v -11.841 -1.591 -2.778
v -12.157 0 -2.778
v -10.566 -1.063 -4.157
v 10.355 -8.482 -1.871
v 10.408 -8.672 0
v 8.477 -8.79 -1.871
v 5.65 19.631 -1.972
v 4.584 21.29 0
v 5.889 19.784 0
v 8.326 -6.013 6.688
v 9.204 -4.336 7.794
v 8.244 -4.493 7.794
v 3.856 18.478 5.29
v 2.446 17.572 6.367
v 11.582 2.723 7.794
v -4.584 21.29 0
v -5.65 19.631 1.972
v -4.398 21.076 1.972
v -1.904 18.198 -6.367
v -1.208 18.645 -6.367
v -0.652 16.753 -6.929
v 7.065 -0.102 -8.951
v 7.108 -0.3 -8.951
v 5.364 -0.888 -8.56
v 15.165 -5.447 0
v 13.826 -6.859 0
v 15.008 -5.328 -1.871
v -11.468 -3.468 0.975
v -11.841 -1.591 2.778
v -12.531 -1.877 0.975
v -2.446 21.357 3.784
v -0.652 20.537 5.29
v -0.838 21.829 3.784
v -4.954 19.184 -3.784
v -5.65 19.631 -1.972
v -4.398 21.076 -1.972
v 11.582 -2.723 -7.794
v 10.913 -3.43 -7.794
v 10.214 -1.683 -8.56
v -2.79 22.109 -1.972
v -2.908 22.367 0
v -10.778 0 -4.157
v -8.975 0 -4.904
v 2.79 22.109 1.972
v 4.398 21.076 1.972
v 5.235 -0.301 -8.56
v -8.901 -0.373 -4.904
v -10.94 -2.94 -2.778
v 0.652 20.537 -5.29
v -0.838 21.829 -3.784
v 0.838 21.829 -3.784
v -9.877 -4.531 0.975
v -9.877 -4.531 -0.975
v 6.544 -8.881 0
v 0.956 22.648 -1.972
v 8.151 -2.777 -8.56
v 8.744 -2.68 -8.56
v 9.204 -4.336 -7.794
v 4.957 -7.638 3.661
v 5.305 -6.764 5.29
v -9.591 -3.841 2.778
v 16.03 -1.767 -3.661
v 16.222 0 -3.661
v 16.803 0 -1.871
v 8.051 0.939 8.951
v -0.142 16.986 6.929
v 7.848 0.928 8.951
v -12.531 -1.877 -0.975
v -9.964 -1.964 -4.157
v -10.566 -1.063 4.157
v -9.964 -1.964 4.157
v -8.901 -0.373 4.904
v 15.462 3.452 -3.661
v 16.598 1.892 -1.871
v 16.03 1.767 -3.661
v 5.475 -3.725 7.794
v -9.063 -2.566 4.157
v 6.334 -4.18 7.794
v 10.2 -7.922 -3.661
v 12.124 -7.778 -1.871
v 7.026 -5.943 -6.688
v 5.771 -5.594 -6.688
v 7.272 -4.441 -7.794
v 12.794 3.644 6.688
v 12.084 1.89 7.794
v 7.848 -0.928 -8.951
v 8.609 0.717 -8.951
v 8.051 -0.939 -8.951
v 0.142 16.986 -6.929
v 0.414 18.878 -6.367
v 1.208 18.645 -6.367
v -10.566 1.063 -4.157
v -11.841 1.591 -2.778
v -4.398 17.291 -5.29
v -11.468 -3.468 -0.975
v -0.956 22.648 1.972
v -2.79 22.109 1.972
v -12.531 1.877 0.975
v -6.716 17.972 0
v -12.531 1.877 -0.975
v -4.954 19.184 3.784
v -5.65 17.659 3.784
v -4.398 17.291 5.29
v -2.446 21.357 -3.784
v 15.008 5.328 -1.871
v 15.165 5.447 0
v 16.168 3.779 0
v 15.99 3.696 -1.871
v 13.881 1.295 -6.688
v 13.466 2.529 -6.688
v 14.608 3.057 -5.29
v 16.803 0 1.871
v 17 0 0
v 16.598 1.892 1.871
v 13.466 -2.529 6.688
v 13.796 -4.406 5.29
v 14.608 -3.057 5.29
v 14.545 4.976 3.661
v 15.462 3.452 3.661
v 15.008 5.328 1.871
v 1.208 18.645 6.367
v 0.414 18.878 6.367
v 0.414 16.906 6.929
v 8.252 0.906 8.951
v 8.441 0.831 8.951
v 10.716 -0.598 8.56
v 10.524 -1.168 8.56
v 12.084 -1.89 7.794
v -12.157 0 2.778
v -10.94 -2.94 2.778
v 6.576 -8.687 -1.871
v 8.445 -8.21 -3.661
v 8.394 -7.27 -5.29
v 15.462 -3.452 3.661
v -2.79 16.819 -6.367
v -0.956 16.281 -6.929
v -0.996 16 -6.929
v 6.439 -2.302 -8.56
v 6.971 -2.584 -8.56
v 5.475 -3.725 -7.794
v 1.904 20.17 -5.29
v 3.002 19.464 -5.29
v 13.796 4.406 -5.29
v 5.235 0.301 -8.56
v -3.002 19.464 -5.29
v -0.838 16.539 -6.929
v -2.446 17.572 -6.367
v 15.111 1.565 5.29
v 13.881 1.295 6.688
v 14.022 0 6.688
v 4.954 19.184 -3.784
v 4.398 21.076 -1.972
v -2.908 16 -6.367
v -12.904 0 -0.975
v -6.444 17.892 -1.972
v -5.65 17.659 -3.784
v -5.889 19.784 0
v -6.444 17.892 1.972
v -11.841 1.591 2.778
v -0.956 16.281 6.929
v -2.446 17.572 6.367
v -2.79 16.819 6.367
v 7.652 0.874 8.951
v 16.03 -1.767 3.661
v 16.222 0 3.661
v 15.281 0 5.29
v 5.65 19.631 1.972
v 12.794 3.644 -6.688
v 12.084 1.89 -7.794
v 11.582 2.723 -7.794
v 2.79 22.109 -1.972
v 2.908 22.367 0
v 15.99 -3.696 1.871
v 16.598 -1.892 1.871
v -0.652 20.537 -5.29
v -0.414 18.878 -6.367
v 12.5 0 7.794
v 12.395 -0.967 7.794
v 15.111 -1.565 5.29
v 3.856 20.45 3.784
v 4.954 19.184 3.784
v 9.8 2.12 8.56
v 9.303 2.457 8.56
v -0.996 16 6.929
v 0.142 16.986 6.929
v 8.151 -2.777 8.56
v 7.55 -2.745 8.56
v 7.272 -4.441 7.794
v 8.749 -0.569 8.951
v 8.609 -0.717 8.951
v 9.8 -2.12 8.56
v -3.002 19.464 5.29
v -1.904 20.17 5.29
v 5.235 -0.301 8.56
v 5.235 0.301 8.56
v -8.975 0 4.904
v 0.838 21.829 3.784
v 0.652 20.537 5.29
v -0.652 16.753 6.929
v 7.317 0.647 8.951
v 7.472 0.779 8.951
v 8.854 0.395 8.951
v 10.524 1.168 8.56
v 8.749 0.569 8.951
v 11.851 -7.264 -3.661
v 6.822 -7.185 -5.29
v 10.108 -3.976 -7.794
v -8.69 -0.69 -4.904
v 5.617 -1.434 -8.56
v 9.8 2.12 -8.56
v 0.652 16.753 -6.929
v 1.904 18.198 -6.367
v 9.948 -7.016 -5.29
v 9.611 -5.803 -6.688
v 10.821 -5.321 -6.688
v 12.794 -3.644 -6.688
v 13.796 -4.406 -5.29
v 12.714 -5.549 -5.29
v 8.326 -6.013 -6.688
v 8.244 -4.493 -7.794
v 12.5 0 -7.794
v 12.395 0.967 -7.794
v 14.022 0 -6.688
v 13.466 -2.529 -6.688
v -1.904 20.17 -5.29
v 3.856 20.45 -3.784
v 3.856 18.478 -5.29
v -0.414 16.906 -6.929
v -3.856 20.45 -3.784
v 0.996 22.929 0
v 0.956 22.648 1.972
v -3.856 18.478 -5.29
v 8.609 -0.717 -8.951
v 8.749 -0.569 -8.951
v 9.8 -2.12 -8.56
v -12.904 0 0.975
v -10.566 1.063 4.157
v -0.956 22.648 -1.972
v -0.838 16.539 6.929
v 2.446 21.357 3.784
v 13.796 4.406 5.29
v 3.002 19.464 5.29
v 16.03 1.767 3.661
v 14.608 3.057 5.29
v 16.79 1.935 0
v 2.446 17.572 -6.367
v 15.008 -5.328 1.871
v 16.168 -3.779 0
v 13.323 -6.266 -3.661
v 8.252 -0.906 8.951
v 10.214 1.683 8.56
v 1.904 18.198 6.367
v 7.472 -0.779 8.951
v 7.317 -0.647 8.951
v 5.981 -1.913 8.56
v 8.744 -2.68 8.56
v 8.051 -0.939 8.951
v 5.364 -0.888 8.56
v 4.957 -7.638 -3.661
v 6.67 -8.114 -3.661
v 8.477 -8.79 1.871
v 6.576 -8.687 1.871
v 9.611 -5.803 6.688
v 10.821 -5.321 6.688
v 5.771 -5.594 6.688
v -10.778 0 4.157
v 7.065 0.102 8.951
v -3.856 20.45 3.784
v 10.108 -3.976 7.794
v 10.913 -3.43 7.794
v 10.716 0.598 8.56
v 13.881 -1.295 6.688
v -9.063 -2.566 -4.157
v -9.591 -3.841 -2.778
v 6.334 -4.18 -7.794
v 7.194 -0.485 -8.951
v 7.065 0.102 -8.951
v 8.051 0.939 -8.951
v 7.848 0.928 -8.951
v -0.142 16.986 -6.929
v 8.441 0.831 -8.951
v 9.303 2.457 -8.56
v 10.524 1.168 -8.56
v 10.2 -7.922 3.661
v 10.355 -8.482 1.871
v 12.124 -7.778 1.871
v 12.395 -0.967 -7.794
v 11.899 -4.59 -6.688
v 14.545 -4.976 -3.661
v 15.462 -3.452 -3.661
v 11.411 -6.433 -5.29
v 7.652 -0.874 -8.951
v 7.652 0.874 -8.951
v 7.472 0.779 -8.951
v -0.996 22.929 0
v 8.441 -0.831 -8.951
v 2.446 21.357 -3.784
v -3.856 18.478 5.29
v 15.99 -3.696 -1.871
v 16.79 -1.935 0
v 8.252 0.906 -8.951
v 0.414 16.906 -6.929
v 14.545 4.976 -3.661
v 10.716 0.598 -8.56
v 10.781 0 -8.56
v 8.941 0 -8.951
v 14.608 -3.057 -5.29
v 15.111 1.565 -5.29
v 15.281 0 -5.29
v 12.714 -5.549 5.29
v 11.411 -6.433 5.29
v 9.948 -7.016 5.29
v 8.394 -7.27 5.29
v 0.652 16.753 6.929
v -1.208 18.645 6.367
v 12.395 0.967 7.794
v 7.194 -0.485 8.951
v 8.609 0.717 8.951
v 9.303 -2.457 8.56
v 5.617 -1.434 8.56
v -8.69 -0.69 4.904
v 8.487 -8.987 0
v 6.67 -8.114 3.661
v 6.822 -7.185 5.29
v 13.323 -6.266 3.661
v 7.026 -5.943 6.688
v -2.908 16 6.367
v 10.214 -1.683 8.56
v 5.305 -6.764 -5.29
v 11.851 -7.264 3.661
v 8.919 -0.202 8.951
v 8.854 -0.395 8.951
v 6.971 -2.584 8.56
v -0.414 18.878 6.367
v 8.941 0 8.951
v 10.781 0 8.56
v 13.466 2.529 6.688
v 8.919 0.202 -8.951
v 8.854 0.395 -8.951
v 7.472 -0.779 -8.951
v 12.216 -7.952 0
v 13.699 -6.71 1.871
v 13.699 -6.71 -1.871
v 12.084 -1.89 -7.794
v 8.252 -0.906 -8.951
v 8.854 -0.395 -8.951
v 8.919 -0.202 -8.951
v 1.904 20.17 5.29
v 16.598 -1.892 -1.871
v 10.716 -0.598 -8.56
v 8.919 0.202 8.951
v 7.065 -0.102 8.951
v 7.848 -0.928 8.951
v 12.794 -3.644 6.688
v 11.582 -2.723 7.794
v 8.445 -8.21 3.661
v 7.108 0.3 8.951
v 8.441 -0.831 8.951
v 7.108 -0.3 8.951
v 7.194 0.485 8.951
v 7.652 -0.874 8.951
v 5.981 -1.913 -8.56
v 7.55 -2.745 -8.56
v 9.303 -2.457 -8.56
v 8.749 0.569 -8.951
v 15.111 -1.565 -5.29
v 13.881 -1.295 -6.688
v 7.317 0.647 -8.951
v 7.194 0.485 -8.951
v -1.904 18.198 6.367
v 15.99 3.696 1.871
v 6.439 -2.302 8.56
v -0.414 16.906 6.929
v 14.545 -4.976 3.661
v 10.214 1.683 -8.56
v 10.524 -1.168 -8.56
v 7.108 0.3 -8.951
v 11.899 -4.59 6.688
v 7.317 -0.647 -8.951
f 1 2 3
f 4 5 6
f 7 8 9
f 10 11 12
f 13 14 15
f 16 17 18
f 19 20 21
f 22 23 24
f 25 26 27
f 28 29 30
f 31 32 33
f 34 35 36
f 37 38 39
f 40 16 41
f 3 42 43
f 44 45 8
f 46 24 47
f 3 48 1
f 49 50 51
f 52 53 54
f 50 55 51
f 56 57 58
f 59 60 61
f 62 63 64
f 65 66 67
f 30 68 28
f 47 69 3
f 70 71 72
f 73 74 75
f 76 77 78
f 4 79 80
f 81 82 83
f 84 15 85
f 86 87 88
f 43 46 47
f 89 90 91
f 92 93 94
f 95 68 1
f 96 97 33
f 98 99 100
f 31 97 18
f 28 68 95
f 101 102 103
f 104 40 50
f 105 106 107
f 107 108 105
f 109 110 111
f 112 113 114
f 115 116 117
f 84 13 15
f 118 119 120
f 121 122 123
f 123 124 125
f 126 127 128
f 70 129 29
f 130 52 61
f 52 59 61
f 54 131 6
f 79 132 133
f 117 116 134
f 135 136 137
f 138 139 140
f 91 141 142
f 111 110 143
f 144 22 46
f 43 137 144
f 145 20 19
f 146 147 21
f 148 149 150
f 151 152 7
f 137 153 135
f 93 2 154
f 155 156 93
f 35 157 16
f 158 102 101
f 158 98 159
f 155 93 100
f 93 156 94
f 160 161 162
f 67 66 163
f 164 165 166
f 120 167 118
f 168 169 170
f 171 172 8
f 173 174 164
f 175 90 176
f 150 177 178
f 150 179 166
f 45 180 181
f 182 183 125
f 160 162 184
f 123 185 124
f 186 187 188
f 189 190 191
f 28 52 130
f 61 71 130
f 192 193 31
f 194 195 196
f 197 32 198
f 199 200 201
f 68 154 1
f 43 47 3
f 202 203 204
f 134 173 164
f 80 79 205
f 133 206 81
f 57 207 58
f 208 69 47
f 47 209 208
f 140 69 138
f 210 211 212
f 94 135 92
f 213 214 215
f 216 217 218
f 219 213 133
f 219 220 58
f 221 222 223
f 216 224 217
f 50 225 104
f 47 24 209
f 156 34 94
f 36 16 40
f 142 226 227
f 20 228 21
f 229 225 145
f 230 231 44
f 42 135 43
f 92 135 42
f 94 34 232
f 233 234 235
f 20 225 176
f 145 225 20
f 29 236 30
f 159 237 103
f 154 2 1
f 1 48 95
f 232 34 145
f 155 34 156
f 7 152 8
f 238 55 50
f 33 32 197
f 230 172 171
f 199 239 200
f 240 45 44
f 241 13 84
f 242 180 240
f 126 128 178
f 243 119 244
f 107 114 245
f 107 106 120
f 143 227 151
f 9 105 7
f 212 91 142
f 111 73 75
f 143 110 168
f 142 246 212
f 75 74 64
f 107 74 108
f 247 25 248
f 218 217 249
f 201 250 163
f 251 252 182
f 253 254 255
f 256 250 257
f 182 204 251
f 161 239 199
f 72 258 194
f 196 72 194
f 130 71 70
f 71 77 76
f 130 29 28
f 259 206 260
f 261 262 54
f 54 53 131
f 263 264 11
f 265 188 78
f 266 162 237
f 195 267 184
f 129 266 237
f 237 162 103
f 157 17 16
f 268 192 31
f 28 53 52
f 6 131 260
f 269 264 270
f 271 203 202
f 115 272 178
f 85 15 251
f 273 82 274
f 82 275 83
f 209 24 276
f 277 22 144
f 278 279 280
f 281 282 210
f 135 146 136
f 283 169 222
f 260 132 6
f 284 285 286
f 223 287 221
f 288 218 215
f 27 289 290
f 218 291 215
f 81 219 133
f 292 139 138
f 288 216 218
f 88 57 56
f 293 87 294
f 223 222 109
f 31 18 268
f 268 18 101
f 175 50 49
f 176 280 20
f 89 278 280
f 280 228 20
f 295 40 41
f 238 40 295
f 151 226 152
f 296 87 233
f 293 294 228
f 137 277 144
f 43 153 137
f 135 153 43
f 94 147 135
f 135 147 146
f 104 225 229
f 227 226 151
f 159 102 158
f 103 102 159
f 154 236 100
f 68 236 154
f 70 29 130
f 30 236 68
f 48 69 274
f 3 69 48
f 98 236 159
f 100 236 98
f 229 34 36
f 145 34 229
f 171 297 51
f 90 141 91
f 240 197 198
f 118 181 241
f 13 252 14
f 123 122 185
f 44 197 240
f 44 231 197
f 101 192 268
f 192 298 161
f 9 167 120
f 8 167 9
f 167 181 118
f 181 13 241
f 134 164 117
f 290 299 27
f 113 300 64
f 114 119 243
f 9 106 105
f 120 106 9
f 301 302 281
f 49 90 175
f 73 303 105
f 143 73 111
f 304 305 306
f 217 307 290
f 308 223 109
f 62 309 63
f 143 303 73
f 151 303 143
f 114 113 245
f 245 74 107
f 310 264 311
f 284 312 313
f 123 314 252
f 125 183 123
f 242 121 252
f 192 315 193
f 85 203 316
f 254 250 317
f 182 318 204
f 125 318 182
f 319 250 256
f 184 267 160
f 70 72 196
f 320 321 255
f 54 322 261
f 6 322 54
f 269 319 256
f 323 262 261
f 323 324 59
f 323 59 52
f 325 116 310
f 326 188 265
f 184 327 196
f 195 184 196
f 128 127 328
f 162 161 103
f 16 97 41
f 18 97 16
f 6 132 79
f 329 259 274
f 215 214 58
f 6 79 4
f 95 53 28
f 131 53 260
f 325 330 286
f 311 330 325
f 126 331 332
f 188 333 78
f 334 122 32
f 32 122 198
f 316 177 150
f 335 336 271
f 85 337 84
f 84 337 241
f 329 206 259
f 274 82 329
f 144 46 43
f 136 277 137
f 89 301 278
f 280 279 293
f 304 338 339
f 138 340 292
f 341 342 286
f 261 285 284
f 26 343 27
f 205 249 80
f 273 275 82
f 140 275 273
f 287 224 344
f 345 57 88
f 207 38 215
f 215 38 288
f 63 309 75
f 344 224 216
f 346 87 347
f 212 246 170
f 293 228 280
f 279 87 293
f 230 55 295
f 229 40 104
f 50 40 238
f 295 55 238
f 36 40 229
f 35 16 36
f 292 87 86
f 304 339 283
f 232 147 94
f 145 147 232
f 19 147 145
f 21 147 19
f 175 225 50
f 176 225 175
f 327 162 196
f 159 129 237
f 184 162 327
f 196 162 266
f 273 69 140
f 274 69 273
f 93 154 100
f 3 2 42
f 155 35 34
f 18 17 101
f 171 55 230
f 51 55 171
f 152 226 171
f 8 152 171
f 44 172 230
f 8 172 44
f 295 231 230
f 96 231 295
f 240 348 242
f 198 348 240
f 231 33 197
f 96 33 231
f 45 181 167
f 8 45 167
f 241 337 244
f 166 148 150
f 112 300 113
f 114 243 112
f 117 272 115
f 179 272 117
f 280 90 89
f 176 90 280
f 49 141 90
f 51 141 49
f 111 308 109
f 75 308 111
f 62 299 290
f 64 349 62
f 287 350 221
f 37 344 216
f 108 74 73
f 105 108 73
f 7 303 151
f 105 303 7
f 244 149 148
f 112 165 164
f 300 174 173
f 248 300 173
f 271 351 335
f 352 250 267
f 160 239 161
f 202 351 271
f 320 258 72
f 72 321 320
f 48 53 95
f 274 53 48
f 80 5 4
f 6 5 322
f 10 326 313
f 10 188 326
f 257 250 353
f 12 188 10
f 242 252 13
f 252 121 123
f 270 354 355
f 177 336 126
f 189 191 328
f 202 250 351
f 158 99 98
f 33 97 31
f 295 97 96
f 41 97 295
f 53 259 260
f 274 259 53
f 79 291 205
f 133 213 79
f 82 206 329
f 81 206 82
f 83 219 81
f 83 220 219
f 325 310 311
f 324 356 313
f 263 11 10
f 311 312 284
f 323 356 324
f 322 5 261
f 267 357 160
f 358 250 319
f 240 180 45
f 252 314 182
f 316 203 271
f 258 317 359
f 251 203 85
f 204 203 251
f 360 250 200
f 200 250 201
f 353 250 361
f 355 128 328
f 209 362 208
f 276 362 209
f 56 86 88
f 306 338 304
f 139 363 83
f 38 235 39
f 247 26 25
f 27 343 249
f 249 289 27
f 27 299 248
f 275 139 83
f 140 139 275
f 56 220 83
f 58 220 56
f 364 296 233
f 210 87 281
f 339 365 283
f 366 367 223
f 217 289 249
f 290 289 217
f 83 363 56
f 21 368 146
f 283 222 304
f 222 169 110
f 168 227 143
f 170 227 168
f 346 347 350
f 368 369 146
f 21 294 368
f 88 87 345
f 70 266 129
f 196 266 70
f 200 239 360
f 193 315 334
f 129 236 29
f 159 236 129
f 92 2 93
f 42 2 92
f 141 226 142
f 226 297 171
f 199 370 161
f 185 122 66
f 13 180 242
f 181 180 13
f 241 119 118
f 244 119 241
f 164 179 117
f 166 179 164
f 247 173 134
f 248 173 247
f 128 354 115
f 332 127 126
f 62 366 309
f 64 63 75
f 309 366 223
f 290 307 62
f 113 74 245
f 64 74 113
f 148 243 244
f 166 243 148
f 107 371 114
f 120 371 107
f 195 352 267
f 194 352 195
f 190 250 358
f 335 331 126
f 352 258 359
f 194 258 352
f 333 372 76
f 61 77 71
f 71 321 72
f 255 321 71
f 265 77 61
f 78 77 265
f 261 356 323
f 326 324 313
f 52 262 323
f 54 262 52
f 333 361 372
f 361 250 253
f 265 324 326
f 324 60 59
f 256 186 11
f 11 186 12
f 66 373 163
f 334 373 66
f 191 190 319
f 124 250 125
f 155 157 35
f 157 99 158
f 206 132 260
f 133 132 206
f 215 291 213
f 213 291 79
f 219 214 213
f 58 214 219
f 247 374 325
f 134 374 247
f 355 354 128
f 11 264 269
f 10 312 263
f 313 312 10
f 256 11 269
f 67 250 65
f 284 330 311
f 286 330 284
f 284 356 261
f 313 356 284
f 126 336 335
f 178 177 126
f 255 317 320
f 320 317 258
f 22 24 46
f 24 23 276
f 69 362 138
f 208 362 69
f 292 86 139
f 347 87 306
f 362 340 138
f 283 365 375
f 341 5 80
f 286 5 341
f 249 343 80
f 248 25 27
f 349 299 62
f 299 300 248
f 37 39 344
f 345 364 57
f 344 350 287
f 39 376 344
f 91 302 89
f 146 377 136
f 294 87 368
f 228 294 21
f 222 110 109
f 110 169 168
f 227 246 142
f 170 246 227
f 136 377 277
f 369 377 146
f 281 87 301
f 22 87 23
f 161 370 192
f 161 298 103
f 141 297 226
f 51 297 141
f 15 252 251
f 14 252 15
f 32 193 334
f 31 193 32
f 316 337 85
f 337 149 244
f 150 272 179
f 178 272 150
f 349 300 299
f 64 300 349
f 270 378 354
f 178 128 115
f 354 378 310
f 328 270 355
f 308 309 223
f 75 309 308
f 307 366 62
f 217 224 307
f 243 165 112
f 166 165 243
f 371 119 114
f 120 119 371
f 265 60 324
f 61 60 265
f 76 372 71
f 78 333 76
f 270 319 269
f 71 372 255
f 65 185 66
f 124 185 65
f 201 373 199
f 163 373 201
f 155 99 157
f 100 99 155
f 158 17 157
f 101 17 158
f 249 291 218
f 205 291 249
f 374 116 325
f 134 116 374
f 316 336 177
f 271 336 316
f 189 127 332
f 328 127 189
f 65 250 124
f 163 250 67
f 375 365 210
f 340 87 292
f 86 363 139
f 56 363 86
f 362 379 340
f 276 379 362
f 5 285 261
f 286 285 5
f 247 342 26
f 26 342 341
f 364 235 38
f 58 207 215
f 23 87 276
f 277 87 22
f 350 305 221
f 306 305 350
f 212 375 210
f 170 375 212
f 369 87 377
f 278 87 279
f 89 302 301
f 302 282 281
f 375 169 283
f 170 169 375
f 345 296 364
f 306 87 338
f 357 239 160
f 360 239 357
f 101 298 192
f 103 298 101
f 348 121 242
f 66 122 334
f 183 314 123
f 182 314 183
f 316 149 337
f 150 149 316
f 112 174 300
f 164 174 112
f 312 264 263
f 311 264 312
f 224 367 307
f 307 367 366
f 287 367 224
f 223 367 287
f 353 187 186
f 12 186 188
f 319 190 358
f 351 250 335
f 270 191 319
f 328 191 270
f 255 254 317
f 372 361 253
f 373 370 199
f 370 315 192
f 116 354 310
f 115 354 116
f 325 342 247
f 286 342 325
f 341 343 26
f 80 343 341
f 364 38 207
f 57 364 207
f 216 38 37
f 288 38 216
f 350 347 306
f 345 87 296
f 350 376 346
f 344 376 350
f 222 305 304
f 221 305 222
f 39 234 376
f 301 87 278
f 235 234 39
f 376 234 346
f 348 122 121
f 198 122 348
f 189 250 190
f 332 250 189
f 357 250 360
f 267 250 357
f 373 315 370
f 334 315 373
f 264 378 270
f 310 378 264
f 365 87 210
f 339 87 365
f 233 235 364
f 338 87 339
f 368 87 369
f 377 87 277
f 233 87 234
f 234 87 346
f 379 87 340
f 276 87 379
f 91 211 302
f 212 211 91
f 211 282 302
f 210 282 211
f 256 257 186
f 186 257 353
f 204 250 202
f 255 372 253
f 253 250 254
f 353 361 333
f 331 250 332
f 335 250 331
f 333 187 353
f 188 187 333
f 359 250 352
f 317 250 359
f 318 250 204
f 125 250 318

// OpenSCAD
// Known scad123d mesh-fallback case (hull of 3+ spheres).
// Use this to see converter warnings and faceted drawing edges.
hull() {
    translate([-8, 0, 0]) sphere(r = 5);
    translate([8, 0, 0]) sphere(r = 9);
    translate([0, 16, 0]) sphere(r = 7);
}
